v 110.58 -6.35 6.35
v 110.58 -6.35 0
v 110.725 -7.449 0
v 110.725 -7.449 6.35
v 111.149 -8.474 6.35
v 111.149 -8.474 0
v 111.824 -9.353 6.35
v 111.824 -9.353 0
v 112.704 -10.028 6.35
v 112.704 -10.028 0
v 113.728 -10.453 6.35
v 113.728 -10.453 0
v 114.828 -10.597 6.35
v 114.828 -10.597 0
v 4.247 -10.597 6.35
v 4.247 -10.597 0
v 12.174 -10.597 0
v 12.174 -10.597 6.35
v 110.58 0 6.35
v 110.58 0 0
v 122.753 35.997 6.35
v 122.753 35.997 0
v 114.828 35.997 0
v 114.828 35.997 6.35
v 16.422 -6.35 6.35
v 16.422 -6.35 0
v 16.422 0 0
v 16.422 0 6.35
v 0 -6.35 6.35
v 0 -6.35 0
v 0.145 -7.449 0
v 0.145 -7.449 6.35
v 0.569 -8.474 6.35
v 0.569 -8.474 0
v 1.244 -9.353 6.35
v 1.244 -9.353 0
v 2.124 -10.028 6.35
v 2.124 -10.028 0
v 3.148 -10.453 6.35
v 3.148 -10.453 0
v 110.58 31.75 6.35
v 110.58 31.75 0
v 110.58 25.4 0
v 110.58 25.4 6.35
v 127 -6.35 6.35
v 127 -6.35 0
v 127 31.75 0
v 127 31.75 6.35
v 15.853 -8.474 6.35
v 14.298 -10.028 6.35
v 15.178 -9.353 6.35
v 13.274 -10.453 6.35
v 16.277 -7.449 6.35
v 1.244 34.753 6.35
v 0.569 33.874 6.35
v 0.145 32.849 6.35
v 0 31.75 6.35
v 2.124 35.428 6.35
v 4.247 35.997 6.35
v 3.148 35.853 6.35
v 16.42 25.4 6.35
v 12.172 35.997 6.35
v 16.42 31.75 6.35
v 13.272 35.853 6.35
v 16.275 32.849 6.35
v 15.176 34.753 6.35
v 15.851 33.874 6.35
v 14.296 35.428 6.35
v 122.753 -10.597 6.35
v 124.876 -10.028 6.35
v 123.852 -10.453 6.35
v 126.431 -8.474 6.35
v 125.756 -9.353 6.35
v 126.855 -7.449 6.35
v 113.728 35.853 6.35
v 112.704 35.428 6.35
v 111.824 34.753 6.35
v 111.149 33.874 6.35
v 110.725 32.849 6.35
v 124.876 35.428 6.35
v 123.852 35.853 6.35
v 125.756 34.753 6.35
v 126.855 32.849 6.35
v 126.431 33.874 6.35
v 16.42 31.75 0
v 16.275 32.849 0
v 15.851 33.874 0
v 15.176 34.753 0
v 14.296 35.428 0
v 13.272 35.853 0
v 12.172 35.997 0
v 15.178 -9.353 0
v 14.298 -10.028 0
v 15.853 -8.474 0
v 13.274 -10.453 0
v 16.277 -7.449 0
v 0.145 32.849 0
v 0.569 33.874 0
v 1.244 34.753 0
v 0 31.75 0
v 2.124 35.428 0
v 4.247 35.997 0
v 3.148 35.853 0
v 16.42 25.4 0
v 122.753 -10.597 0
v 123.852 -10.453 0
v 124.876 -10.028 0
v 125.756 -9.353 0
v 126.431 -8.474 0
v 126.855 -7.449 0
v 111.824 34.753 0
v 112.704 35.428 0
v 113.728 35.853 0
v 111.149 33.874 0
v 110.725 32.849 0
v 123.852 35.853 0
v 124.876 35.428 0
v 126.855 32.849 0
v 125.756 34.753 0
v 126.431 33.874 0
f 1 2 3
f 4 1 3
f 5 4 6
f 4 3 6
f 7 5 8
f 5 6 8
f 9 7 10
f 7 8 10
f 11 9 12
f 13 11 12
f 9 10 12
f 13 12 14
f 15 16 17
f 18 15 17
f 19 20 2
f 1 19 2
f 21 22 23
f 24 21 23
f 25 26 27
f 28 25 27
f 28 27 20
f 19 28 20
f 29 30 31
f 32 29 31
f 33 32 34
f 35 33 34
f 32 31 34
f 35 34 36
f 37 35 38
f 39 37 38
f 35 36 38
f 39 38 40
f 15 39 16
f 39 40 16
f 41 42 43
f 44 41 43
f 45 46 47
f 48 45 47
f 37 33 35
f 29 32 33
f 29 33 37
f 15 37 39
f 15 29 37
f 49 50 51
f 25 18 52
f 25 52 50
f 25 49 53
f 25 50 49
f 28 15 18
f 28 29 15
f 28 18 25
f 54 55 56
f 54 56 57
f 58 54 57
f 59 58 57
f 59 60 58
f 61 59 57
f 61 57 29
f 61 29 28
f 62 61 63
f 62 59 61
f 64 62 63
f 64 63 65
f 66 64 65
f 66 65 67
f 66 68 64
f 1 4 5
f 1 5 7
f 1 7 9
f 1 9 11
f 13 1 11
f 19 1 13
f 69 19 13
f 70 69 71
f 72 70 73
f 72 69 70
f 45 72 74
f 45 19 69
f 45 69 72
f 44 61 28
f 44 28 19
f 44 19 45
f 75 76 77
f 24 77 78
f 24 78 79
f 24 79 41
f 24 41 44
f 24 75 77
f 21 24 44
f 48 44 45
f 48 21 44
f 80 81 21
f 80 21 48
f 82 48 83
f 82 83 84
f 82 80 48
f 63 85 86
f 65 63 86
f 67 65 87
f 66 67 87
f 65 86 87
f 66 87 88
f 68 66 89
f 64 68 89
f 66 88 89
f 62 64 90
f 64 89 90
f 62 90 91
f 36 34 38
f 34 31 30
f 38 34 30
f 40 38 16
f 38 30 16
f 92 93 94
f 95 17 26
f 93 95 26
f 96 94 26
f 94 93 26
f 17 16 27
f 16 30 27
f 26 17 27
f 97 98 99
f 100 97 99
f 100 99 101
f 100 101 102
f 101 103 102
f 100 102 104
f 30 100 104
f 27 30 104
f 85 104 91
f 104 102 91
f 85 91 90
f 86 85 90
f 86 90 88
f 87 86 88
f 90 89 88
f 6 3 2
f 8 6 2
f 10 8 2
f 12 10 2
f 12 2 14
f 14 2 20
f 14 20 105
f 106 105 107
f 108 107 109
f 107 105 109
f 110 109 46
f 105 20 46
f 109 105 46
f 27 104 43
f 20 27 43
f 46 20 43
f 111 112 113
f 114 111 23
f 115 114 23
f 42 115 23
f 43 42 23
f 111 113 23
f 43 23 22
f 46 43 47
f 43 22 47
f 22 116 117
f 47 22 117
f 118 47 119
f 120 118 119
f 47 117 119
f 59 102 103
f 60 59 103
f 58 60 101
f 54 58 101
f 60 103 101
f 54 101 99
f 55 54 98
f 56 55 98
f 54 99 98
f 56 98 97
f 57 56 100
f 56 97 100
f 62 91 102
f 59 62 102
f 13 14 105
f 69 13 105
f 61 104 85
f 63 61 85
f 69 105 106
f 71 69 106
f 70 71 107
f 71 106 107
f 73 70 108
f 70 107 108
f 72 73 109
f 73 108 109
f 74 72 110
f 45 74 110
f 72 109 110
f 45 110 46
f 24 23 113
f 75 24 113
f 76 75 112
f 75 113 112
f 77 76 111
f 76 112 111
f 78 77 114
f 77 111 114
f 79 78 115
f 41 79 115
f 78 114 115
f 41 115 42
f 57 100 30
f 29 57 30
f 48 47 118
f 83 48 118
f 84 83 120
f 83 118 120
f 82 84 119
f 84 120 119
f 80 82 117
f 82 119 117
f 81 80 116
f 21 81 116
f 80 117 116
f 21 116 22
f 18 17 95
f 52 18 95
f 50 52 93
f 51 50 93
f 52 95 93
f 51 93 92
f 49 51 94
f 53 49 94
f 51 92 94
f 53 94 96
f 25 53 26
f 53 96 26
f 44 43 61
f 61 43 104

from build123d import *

# Parameters (mm, degrees)
F1_DEPTH = 6.35


with BuildPart() as f1:
    # F0 (on Top) → F1 (new body)
    with BuildSketch(Plane.XY):
        Polygon((0, 25.4), (0, 0), (16.421834, 0), (110.580266, 0), (127, 0), (127, 25.4), (110.580266, 25.4), (16.419734, 25.4), align=None)
        with BuildLine():
            Line((16.421834, 0), (0, 0))
            Line((0, 0), (0, -6.35))
            ThreePointArc((0, -6.35), (1.244054, -9.353413), (4.247467, -10.597467))
            Line((4.247467, -10.597467), (12.174367, -10.597467))
            ThreePointArc((12.174367, -10.597467), (15.17778, -9.353413), (16.421834, -6.35))
            Line((16.421834, -6.35), (16.421834, 0))
        make_face()
        with BuildLine():
            Line((0, 31.75), (0, 25.4))
            Line((0, 25.4), (16.419734, 25.4))
            Line((16.419734, 25.4), (16.419734, 31.75))
            ThreePointArc((16.419734, 31.75), (15.17568, 34.753413), (12.172267, 35.997467))
            Line((12.172267, 35.997467), (4.247467, 35.997467))
            ThreePointArc((4.247467, 35.997467), (1.244054, 34.753413), (0, 31.75))
        make_face()
        with BuildLine():
            Line((127, 0), (110.580266, 0))
            Line((110.580266, 0), (110.580266, -6.35))
            ThreePointArc((110.580266, -6.35), (111.82432, -9.353413), (114.827733, -10.597467))
            Line((114.827733, -10.597467), (122.752533, -10.597467))
            ThreePointArc((122.752533, -10.597467), (125.755946, -9.353413), (127, -6.35))
            Line((127, -6.35), (127, 0))
        make_face()
        with BuildLine():
            Line((110.580266, 31.75), (110.580266, 25.4))
            Line((110.580266, 25.4), (127, 25.4))
            Line((127, 25.4), (127, 31.75))
            ThreePointArc((127, 31.75), (125.755946, 34.753413), (122.752533, 35.997467))
            Line((122.752533, 35.997467), (114.827733, 35.997467))
            ThreePointArc((114.827733, 35.997467), (111.82432, 34.753413), (110.580266, 31.75))
        make_face()
    extrude(amount=F1_DEPTH)


solid = f1.part
